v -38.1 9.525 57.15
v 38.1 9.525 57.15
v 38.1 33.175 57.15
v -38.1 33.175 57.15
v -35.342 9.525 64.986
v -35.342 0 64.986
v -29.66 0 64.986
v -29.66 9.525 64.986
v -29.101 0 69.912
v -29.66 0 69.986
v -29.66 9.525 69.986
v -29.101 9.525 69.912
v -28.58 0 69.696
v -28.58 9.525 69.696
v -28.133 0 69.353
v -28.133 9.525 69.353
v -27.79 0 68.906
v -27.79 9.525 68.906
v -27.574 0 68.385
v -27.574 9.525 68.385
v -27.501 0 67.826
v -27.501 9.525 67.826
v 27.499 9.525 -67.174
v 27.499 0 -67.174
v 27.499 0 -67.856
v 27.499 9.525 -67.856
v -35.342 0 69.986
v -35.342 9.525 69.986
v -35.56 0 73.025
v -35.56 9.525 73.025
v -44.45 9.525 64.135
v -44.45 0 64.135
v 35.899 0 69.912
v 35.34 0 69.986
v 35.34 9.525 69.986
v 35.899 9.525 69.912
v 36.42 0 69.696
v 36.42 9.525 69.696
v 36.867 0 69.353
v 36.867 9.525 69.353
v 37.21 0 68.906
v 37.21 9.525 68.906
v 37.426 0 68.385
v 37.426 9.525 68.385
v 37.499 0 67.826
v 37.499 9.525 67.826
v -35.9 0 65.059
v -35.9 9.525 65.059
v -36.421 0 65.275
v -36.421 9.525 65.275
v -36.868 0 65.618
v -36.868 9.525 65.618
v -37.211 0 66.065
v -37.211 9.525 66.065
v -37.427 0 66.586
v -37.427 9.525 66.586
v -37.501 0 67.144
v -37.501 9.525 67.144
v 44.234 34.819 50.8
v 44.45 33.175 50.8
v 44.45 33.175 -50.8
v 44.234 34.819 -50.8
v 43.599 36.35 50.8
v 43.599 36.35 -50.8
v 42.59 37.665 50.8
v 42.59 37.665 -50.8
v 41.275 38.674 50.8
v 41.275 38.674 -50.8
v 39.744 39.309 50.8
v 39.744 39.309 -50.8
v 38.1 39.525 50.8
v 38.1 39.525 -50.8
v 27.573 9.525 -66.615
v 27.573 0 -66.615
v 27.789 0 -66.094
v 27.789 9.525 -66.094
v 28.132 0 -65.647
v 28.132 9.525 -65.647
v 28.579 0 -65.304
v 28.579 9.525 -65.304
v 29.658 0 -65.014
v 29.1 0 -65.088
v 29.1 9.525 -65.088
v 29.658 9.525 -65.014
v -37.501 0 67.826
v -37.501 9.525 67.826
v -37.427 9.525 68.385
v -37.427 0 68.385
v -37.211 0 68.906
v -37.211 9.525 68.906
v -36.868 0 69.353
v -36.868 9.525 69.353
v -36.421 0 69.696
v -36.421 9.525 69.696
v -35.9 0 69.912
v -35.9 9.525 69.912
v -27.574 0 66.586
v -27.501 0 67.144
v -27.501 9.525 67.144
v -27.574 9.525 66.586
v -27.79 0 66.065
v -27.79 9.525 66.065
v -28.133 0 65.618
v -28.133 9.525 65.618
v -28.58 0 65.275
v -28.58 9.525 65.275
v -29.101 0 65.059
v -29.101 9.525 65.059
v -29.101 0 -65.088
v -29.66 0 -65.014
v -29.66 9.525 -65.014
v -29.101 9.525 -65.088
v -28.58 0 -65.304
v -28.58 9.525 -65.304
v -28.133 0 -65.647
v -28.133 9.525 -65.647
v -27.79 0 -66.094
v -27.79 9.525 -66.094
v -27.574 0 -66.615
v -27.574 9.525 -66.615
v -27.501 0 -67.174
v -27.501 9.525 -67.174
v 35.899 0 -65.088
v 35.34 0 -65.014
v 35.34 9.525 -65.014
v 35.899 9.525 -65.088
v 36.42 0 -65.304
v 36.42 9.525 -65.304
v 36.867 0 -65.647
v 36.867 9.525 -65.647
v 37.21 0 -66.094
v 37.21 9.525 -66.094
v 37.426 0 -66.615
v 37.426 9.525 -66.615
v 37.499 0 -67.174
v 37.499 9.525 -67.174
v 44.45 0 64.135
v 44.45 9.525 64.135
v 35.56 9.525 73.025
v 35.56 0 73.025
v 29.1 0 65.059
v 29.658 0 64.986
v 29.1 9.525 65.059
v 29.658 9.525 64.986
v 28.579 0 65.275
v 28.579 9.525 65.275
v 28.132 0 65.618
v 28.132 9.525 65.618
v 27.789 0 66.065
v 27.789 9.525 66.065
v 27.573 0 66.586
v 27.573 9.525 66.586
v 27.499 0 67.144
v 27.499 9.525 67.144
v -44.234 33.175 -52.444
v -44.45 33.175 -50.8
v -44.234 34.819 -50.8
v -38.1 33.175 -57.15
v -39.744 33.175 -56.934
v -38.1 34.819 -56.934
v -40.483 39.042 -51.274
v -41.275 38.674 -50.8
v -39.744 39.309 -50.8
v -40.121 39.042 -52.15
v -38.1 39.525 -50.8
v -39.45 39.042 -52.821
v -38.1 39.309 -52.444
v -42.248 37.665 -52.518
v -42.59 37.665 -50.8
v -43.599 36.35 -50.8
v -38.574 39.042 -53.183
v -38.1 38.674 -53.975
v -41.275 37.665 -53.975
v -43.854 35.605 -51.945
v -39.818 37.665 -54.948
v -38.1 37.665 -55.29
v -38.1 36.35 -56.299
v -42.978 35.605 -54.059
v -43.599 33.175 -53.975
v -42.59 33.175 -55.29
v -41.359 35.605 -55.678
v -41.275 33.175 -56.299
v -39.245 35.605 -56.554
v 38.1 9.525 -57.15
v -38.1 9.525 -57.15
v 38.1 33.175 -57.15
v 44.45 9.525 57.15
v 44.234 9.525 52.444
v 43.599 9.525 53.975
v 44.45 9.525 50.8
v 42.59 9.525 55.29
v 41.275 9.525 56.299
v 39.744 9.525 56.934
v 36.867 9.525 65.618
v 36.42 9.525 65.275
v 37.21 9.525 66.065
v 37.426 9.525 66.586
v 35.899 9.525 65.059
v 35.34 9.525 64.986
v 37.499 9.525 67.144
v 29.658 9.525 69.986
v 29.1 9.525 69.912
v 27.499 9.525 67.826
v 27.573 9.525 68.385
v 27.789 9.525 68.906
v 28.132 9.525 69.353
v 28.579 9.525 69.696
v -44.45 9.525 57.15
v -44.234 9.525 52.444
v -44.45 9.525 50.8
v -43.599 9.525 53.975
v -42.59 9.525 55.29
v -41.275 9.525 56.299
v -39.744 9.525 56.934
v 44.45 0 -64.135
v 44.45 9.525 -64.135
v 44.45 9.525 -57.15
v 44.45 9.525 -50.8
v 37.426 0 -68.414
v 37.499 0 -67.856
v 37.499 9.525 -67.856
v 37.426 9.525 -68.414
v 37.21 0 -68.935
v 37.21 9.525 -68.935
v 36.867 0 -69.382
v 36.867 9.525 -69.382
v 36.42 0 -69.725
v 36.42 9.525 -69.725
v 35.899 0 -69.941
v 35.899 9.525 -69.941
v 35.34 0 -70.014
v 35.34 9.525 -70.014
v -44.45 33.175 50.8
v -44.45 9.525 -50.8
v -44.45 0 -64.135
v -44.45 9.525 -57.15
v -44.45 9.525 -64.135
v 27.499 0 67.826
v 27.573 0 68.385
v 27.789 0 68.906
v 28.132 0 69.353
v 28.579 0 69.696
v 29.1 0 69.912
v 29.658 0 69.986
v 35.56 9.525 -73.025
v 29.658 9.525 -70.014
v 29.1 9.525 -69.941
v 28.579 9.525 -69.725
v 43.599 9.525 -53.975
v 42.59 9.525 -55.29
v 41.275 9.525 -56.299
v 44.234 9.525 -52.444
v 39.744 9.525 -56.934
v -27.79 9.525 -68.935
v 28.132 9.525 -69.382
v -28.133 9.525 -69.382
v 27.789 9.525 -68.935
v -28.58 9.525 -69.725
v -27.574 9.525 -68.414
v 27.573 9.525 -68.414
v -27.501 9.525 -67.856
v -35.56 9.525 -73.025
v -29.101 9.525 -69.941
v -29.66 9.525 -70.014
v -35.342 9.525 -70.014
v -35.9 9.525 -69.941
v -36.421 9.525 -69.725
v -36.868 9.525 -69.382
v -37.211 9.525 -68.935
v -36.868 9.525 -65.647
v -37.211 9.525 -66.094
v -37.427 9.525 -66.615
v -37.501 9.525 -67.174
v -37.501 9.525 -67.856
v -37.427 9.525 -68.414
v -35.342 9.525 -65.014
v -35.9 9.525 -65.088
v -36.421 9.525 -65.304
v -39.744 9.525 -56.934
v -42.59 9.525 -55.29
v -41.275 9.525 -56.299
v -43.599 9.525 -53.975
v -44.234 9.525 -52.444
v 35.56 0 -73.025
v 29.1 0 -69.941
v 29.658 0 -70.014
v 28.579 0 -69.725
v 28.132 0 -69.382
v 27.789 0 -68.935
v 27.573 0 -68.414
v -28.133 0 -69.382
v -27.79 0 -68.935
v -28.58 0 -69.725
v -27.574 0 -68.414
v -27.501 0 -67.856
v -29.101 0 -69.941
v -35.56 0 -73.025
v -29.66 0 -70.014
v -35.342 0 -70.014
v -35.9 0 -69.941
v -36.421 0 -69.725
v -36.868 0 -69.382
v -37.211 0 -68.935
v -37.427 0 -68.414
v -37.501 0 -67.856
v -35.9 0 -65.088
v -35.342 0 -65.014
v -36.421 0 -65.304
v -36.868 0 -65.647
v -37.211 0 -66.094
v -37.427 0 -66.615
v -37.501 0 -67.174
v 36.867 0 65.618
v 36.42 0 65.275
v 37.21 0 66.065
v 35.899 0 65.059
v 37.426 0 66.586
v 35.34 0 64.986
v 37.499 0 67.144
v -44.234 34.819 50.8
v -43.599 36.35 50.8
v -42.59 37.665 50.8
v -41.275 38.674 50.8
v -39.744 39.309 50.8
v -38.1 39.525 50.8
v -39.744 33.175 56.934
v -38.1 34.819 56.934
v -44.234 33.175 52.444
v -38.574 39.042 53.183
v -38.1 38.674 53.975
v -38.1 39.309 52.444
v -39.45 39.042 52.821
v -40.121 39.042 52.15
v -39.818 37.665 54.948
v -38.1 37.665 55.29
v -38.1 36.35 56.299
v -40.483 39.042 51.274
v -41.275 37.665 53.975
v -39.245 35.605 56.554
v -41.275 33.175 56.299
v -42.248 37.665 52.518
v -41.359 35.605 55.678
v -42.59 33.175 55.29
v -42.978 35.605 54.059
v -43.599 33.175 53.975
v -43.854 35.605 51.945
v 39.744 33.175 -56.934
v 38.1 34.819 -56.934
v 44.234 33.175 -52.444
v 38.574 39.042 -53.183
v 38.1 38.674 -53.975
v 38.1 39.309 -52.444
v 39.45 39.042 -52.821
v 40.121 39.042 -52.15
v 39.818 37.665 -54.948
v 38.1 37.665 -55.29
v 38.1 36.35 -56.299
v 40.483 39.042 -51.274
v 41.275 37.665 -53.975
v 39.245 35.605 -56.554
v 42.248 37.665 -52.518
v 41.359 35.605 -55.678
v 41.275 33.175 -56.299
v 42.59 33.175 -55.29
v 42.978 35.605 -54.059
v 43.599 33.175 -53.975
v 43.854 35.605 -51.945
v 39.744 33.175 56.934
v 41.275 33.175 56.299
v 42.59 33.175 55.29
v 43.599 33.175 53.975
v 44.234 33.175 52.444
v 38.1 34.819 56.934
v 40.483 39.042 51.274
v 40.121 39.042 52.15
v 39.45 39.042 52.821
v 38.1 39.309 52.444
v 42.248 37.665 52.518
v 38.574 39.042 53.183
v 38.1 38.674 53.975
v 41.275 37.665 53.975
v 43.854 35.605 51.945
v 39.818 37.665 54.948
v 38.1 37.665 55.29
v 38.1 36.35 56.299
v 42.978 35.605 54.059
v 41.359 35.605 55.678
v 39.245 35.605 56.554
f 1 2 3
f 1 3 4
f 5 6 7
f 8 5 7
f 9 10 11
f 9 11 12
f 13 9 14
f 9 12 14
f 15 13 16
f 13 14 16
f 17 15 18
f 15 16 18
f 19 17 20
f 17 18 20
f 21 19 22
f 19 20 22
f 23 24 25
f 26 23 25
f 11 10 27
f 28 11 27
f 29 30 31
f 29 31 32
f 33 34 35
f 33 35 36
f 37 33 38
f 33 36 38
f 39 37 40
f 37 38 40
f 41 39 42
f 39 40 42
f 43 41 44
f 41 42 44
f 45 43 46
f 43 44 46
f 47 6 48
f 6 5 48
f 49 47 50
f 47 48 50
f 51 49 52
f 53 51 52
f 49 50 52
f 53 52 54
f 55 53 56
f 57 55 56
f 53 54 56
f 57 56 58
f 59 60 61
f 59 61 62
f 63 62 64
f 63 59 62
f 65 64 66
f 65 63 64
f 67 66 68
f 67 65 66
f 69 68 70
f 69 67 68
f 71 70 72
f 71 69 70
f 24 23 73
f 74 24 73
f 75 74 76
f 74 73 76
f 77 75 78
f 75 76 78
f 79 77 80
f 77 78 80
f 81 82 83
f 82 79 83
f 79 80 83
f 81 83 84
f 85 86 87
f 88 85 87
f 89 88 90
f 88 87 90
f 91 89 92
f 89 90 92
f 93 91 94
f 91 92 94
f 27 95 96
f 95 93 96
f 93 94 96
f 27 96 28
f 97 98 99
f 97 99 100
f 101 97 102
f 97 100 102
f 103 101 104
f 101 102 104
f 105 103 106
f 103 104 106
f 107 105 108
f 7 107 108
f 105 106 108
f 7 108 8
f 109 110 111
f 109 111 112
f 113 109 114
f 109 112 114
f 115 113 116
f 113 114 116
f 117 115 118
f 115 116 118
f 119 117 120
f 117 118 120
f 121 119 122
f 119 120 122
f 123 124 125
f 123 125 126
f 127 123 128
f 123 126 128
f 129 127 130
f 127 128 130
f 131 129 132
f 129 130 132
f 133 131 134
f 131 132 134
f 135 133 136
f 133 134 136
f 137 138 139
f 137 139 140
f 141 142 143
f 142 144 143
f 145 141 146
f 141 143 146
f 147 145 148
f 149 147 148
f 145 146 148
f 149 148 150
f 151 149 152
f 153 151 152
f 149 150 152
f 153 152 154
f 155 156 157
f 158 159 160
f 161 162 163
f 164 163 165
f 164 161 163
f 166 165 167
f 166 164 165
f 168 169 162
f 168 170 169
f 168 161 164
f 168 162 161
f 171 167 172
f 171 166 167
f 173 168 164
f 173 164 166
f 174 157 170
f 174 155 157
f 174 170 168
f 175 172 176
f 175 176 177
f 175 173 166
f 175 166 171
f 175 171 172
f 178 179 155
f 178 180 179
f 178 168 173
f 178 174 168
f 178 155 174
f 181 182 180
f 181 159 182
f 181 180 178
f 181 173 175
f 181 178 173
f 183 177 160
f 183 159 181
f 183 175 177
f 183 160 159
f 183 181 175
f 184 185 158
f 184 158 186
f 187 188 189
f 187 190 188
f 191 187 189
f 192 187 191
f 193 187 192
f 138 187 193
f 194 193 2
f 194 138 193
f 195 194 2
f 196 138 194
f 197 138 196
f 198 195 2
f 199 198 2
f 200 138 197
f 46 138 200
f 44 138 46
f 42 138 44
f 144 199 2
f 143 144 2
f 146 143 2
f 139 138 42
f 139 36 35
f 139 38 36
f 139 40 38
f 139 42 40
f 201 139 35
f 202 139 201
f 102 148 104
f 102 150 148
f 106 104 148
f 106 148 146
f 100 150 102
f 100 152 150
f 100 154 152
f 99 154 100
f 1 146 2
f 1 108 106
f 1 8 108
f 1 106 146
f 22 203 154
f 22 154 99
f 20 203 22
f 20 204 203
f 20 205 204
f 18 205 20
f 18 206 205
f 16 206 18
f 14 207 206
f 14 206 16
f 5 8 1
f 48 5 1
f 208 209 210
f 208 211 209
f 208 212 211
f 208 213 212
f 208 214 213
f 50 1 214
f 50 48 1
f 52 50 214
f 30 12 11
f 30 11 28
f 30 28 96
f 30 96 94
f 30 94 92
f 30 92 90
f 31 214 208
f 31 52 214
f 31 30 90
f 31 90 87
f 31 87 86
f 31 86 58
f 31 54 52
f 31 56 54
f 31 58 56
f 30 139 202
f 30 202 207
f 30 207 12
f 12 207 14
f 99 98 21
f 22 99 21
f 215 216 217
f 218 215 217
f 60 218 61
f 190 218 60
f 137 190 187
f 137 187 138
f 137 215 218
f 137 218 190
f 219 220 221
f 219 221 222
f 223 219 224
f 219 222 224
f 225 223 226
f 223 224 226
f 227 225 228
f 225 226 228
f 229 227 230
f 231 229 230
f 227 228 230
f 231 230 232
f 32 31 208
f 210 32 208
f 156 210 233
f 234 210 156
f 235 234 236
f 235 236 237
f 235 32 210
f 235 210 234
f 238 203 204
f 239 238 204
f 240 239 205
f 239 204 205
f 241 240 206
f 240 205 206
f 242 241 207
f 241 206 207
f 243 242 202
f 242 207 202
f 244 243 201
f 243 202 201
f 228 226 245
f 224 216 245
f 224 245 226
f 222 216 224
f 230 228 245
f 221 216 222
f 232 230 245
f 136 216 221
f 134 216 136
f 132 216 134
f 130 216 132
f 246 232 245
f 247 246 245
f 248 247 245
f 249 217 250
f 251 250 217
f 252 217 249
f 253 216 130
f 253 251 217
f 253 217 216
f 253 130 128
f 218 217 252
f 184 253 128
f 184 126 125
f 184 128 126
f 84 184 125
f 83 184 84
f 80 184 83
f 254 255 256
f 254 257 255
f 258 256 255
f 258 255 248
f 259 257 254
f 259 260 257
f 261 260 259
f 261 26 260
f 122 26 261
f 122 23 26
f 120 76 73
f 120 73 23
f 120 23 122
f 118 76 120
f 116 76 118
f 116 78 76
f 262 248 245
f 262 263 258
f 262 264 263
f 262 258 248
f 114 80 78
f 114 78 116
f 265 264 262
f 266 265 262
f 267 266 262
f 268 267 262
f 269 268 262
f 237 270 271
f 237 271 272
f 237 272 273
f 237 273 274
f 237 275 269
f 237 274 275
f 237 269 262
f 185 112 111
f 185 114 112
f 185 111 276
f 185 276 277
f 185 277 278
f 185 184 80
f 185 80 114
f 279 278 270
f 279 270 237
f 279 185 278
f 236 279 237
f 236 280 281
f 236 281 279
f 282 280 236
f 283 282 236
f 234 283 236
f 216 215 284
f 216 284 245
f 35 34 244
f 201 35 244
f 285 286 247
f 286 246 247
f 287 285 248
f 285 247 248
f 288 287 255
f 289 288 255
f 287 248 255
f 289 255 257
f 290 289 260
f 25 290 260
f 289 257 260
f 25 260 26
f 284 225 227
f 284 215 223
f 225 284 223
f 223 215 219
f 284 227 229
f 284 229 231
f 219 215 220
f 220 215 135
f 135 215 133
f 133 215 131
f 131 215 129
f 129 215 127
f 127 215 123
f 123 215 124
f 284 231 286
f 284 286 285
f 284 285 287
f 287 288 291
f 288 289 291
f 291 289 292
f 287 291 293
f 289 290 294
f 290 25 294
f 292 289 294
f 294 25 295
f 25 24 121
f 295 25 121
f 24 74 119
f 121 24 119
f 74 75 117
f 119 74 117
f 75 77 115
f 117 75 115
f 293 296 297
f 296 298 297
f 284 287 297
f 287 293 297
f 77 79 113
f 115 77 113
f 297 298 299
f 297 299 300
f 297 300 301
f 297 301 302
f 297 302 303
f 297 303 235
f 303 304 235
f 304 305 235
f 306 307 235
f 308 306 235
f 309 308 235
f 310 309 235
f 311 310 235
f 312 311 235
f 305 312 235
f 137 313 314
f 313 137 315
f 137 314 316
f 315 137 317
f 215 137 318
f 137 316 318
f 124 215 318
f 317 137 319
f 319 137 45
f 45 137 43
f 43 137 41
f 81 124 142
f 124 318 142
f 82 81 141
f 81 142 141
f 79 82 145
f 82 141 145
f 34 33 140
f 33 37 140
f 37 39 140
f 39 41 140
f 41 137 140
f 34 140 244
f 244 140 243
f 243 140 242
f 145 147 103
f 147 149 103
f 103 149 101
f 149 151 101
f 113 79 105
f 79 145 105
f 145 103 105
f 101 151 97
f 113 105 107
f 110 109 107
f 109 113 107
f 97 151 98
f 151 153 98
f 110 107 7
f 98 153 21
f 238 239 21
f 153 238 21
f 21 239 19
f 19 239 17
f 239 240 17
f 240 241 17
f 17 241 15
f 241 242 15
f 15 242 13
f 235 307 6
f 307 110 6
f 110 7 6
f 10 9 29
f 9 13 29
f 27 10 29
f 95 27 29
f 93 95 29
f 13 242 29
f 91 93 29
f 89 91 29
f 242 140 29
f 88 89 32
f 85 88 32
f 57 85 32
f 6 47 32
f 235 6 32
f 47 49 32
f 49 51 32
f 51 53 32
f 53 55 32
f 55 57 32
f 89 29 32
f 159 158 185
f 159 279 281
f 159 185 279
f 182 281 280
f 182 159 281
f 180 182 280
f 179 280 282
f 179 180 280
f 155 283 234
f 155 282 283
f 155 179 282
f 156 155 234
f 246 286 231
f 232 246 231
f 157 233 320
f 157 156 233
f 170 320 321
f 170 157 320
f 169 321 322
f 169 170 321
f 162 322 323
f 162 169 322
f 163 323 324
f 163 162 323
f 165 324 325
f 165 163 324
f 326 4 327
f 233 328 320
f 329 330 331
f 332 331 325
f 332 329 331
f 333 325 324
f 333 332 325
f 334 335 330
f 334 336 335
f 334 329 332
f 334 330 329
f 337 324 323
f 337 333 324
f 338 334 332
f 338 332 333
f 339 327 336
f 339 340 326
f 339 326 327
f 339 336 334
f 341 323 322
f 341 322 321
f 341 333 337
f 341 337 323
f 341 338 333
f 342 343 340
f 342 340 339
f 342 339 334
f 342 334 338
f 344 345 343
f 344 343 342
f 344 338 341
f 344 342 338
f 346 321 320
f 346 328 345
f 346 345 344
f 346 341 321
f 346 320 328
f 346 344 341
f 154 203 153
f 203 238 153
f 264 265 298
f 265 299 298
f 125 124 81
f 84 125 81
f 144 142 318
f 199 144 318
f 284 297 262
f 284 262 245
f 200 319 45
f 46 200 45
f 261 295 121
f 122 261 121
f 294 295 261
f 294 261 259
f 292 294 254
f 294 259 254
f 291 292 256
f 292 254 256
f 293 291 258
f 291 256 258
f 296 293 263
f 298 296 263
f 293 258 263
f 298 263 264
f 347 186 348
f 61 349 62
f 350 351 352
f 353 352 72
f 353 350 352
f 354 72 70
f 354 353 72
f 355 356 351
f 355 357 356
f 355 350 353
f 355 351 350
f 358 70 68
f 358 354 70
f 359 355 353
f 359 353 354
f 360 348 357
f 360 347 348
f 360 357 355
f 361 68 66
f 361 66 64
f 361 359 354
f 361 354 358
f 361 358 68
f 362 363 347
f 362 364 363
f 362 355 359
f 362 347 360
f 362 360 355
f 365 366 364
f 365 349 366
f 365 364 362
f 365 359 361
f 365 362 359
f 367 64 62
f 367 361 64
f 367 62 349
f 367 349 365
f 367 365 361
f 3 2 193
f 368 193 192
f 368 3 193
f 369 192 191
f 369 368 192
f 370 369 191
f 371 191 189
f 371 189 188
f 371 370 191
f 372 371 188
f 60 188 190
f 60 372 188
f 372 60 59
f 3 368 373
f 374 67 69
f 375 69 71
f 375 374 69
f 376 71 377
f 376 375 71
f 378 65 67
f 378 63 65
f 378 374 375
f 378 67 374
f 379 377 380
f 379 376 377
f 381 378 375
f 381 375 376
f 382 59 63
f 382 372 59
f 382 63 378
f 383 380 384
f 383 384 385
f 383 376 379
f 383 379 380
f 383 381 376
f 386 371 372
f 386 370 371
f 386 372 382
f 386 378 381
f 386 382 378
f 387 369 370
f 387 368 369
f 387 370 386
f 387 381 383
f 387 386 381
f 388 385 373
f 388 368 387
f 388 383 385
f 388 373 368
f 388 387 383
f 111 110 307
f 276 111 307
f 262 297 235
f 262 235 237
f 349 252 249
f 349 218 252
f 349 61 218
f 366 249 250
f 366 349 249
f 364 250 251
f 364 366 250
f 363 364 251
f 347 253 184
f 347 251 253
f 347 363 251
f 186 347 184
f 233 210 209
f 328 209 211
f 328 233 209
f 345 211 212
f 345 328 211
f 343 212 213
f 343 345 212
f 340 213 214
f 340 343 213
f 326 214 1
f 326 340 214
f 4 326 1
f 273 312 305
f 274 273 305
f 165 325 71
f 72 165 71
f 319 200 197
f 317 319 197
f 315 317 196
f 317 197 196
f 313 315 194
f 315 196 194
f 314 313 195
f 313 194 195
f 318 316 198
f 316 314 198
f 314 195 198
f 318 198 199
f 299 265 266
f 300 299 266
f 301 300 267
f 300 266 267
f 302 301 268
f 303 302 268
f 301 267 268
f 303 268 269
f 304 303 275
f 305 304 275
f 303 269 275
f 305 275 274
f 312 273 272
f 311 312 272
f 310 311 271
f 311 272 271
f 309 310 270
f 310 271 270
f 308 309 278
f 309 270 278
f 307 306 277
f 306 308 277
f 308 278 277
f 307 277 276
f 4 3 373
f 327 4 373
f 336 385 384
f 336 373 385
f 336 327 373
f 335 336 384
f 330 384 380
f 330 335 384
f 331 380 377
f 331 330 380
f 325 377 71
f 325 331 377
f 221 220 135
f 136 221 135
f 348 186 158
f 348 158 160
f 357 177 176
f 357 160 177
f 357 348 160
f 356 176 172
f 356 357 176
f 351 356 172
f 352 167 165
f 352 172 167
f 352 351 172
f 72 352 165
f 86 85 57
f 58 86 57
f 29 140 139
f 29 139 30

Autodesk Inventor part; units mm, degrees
ref_plane "YZ Plane" through (0, 0, 0) normal (1, 0, 0) x (0, 1, 0)
ref_plane "XZ Plane" through (0, 0, 0) normal (0, 1, 0) x (-1, 0, 0)
ref_plane "XY Plane" through (0, 0, 0) normal (0, 0, 1) x (1, 0, 0)
sketch "Sketch1" plane through (0, 0, 0) normal (0, 1, 0) x (-1, 0, 0)
  line L0 (-44.45, 73.025) -> (44.45, 73.025)
  line L1 (44.45, 73.025) -> (44.45, -73.025)
  line L2 (44.45, -73.025) -> (-44.45, -73.025)
  line L3 (-44.45, -73.025) -> (-44.45, 73.025)
  line L4 (-44.45, 73.025) -> (44.45, -73.025) construction
  line L5 (44.45, 73.025) -> (-44.45, -73.025) construction
  point P0 (0, 0)
  dimension "d0" = 88.9
  dimension "d1" = 146.05
extrude "Extrusion1" add sketch "Sketch1" along normal blind 9.525
sketch "Sketch2" plane through (0, 9.525, 0) normal (0, 1, 0) x (1, 0, 0)
  line L0 (44.45, -57.15) -> (-44.45, -57.15)
  line L1 (-44.45, -57.15) -> (-44.45, 57.15)
  line L2 (-44.45, 57.15) -> (44.45, 57.15)
  line L3 (44.45, 57.15) -> (44.45, -57.15)
  line L4 (44.45, -57.15) -> (-44.45, 57.15) construction
  line L5 (-44.45, -57.15) -> (44.45, 57.15) construction
  point P0 (0, 0)
  dimension "d4" = 88.9
  dimension "d5" = 114.3
extrude "Extrusion2" add sketch "Sketch2" along normal blind 30
sketch "Sketch3" plane through (0, 0, 0) normal (0, -1, 0) x (1, 0, 0)
  line L0 (-37.5007, -70.0145) -> (-27.5007, -70.0145)
  line L1 (-27.5007, -70.0145) -> (-27.5007, -65.0145)
  line L2 (-27.5007, -65.0145) -> (-37.5007, -65.0145)
  line L3 (-37.5007, -65.0145) -> (-37.5007, -70.0145)
  line L4 (-37.5007, -70.0145) -> (-27.5007, -65.0145) construction
  line L5 (-27.5007, -70.0145) -> (-37.5007, -65.0145) construction
  line L6 (-37.5007, 64.9855) -> (-27.5007, 64.9855)
  line L7 (-27.5007, 64.9855) -> (-27.5007, 69.9855)
  line L8 (-27.5007, 69.9855) -> (-37.5007, 69.9855)
  line L9 (-37.5007, 69.9855) -> (-37.5007, 64.9855)
  line L10 (-37.5007, 64.9855) -> (-27.5007, 69.9855) construction
  line L11 (-27.5007, 64.9855) -> (-37.5007, 69.9855) construction
  line L12 (-44.45, -73.025) -> (44.45, -73.025) projected
  line L13 (27.4993, -70.0145) -> (37.4993, -70.0145)
  line L14 (37.4993, -70.0145) -> (37.4993, -65.0145)
  line L15 (37.4993, -65.0145) -> (27.4993, -65.0145)
  line L16 (27.4993, -65.0145) -> (27.4993, -70.0145)
  line L17 (27.4993, -70.0145) -> (37.4993, -65.0145) construction
  line L18 (37.4993, -70.0145) -> (27.4993, -65.0145) construction
  line L19 (44.45, -73.025) -> (44.45, 73.025) projected
  line L20 (37.4993, 69.9855) -> (27.4993, 69.9855)
  line L21 (27.4993, 69.9855) -> (27.4993, 64.9855)
  line L22 (27.4993, 64.9855) -> (37.4993, 64.9855)
  line L23 (37.4993, 64.9855) -> (37.4993, 69.9855)
  line L24 (37.4993, 69.9855) -> (27.4993, 64.9855) construction
  line L25 (27.4993, 69.9855) -> (37.4993, 64.9855) construction
  point P0 (0, 0)
  point P1 (-32.5007, -67.5145)
  point P2 (-32.5007, 67.4855)
  point P3 (32.4993, -67.5145)
  point P4 (-42.8625, -71.4375)
  point P5 (32.4993, 67.4855)
  dimension "d8" = 10
  dimension "d9" = 5
  dimension "d10" = 10
  dimension "d11" = 5
  dimension "d12" = 0
  dimension "d13" = 135
  dimension "d14" = 5.5105
  dimension "d15" = 10
  dimension "d16" = 5
  dimension "d17" = 65
  dimension "d18" = 5.5105
  dimension "d19" = 11.9507
  dimension "d20" = 5
  dimension "d21" = 10
  dimension "d22" = 135
  dimension "d23" = 11.9507
extrude "Extrusion3" cut sketch "Sketch3" against normal blind 30
fillet "Fillet1" radius 2.159 16 edges at (-27.5007, 4.7625, 64.9855) (-27.5007, 4.7625, 69.9855) (-37.5007, 4.7625, 69.9855) (-37.5007, 4.7625, 64.9855) (37.4993, 4.7625, 64.9855) (37.4993, 4.7625, 69.9855) (27.4993, 4.7625, 64.9855) (27.4993, 4.7625, 69.9855) (27.4993, 4.7625, -65.0145) (37.4993, 4.7625, -70.0145) (37.4993, 4.7625, -65.0145) (27.4993, 4.7625, -70.0145) (-27.5007, 4.7625, -65.0145) (-27.5007, 4.7625, -70.0145) (-37.5007, 4.7625, -65.0145) (-37.5007, 4.7625, -70.0145)
fillet "Fillet2" radius 6.35 1 edges at (-44.45, 24.525, -57.15)
fillet "Fillet3" radius 6.35 8 edges at (-44.45, 24.525, 57.15) (44.45, 24.525, 57.15) (44.45, 24.525, -57.15) (-42.5901, 39.525, -55.2901) (-44.45, 39.525, 3.175) (3.175, 39.525, -57.15) (44.45, 39.525, 0) (0, 39.525, 57.15)
chamfer "Chamfer1" distance 8.89 angle 45 4 edges at (44.45, 4.7625, 73.025) (-44.45, 4.7625, 73.025) (44.45, 4.7625, -73.025) (-44.45, 4.7625, -73.025)
equation "\"d18\" = d14"
equation "\"d20\" = d11"
equation "\"d21\" = d10"
equation "\"d22\" = d13"
equation "\"d23\" = d19"
properties part number "24v Converter"
